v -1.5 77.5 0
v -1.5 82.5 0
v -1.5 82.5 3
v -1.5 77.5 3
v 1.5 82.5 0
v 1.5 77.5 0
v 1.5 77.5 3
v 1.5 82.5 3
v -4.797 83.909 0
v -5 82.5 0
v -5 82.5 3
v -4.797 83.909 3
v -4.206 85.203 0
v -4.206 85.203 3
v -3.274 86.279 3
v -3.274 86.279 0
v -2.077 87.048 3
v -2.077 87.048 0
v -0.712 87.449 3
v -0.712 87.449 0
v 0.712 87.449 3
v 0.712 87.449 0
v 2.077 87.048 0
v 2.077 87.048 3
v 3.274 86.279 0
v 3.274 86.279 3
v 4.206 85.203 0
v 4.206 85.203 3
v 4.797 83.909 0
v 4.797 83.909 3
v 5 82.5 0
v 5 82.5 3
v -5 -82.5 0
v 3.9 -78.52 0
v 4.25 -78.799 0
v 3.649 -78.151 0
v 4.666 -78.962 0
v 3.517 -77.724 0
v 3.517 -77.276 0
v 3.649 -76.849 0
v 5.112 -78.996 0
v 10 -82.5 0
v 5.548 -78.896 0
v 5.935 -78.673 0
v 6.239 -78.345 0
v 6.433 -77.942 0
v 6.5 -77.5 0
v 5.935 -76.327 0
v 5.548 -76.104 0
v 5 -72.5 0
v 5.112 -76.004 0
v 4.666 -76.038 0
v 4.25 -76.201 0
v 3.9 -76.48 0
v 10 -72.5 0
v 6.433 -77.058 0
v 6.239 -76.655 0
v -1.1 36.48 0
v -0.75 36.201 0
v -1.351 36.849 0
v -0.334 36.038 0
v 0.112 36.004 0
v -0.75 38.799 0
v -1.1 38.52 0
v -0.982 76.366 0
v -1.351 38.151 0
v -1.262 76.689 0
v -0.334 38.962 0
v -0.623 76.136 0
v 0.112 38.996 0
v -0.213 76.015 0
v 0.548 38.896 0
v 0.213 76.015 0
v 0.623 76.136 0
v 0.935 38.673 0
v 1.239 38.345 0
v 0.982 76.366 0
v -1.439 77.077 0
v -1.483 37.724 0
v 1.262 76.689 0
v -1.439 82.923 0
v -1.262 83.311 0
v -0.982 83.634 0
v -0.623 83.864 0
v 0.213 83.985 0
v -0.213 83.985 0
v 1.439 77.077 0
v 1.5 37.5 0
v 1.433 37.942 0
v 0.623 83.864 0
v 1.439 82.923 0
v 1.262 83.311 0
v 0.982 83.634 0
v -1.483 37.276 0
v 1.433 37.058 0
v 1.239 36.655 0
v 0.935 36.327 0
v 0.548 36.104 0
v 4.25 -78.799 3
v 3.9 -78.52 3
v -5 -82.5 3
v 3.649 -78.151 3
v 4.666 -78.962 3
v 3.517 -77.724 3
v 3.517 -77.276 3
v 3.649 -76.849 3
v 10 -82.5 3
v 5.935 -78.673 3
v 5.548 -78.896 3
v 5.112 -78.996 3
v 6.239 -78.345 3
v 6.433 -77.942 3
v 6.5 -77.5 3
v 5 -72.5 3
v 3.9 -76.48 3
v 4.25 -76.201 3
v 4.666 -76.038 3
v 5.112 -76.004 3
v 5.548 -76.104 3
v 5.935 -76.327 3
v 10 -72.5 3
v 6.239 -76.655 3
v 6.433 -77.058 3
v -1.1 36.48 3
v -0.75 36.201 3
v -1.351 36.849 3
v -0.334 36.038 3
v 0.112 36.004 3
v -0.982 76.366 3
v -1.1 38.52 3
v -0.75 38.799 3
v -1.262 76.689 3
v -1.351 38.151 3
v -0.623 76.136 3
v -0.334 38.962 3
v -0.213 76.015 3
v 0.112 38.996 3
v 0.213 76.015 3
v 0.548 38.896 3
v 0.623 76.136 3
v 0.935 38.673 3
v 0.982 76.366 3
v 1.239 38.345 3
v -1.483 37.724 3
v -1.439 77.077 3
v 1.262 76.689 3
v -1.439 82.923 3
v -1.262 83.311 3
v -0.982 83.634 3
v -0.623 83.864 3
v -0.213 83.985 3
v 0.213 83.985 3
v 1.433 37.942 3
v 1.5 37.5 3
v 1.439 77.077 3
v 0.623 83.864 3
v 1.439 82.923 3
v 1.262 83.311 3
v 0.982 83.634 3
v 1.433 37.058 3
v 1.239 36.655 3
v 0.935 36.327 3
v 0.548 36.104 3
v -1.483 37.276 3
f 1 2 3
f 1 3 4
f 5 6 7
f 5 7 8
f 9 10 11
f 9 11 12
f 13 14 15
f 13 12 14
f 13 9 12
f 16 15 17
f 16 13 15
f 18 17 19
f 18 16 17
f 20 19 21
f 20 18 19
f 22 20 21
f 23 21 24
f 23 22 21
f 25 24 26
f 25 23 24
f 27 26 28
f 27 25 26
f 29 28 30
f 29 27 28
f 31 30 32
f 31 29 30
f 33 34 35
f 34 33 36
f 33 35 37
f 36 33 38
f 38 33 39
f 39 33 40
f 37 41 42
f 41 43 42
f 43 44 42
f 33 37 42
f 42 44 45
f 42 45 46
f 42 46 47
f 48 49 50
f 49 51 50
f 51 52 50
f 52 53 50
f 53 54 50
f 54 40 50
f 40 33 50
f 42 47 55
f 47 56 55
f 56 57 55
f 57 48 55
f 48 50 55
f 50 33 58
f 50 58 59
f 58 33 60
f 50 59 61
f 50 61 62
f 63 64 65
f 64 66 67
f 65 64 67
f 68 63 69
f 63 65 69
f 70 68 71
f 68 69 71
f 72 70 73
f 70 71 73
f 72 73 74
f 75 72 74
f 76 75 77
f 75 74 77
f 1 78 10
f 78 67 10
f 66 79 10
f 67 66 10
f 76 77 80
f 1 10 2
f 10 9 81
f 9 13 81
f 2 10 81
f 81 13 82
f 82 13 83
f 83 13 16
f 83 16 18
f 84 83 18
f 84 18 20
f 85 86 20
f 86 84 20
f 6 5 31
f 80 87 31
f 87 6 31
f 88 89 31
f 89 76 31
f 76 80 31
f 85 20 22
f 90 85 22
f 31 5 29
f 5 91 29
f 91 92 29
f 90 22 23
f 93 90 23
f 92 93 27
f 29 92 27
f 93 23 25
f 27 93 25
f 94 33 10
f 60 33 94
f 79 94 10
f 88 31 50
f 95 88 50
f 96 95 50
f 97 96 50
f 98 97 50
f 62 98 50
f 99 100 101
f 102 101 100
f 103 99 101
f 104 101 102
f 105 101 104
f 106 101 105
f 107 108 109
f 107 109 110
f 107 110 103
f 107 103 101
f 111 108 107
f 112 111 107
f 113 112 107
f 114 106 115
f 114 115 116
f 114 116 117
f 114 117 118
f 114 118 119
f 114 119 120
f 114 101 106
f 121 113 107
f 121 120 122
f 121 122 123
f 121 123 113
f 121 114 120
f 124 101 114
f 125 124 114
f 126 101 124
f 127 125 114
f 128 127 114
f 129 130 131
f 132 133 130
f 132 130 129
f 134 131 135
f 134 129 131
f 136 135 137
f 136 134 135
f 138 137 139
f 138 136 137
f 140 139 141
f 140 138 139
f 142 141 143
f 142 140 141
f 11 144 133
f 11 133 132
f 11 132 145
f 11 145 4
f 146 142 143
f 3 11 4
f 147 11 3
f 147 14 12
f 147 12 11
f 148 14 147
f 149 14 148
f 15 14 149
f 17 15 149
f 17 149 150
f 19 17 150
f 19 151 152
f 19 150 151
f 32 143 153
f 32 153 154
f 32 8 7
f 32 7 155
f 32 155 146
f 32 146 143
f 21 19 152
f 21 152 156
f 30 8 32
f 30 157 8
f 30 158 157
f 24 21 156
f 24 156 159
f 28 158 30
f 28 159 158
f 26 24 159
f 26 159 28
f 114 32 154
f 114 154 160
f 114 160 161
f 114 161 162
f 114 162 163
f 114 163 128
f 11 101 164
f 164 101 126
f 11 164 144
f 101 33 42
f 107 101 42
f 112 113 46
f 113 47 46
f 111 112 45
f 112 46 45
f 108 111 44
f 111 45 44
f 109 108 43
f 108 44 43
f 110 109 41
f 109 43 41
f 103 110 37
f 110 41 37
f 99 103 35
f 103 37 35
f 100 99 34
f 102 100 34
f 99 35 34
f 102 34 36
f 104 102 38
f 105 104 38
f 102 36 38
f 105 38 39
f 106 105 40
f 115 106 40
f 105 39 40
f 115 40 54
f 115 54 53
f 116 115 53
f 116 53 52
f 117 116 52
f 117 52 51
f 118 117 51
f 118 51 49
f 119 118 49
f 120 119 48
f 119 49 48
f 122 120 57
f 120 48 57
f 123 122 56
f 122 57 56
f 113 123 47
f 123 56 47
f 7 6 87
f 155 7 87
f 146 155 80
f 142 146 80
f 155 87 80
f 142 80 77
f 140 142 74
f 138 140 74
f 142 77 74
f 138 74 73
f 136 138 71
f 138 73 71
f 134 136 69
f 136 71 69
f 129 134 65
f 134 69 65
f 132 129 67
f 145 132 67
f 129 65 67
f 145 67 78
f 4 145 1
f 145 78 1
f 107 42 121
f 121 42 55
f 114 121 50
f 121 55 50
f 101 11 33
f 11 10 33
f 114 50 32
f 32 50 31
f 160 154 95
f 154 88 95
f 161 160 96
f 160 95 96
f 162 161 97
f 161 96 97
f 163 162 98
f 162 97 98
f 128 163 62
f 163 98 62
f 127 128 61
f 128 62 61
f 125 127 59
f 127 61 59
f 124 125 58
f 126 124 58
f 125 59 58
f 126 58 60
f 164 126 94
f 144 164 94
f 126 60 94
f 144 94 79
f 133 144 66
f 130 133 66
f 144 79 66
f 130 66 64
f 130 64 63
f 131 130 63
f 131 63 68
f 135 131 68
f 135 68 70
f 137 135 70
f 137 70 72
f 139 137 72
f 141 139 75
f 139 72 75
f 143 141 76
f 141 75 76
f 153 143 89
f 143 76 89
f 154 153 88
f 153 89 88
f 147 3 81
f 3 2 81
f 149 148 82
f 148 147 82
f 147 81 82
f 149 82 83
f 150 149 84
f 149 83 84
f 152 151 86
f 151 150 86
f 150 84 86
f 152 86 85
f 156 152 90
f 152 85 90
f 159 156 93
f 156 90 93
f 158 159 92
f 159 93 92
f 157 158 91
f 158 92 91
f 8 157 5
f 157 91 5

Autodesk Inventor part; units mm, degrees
ref_plane "YZ Plane" through (0, 0, 0) normal (1, 0, 0) x (0, 1, 0)
ref_plane "XZ Plane" through (0, 0, 0) normal (0, 1, 0) x (-1, 0, 0)
ref_plane "XY Plane" through (0, 0, 0) normal (0, 0, 1) x (1, 0, 0)
sketch "Эскиз1" plane through (0, 0, 0) normal (0, 0, 1) x (1, 0, 0)
  line L0 (-5, -82.5) -> (5, -82.5)
  line L1 (5, -82.5) -> (5, 82.5)
  line L2 (5, 82.5) -> (-5, 82.5)
  line L3 (-5, 82.5) -> (-5, -82.5)
  line L4 (-5, -82.5) -> (5, 82.5) construction
  line L5 (5, -82.5) -> (-5, 82.5) construction
  line L6 (-5, 82.5) -> (0, 82.5)
  line L7 (0, 82.5) -> (0, 77.5)
  line L8 (0, 77.5) -> (-5, 77.5)
  line L9 (-5, 77.5) -> (-5, 82.5)
  circle A0 centre (0, 77.5) radius 1.5
  line L10 (-5, 82.5) -> (5, 82.5)
  line L11 (5, 82.5) -> (5, 87.5)
  line L12 (5, 87.5) -> (-5, 87.5)
  line L13 (-5, 87.5) -> (-5, 82.5)
  circle A1 centre (0, 82.5) radius 1.5
  line L14 (-1.5, 82.5) -> (-1.5, 77.5)
  line L15 (1.5, 77.5) -> (1.5, 82.5)
  arc A2 (5, 82.5) -> (-5, 82.5) centre (0, 82.5) ccw
  line L16 (0, 77.5) -> (-5, 77.5)
  line L17 (-5, 77.5) -> (-5, 37.5)
  line L18 (-5, 37.5) -> (0, 37.5)
  line L19 (0, 37.5) -> (0, 77.5)
  circle A3 centre (0, 37.5) radius 1.5
  line L20 (-5, -82.5) -> (0, -82.5)
  line L21 (0, -82.5) -> (0, -77.5)
  line L22 (0, -77.5) -> (-5, -77.5)
  line L23 (-5, -77.5) -> (-5, -82.5)
  line L24 (-5, -82.5) -> (10, -82.5)
  line L25 (10, -82.5) -> (10, -72.5)
  line L26 (10, -72.5) -> (-5, -72.5)
  line L27 (-5, -72.5) -> (-5, -82.5)
  circle A4 centre (5, -77.5) radius 1.5
  point P0 (0, 0)
  point P1 (5, -72.5)
  dimension "d0" = 10
  dimension "d1" = 165
  dimension "d2" = 5
  dimension "d3" = 3
  dimension "d4" = 5
  dimension "d5" = 3
  dimension "d6" = 40
  dimension "d7" = 3
  dimension "d8" = 5
  dimension "d12" = 15
  dimension "d13" = 10
  dimension "d14" = 3
extrude "Выдавливание1" add sketch "Эскиз1" along normal blind 3 contours L3 L22 L21 L0 | L21 L22 L3 L26 L1 A4 L0 | L1 A4 L26 L25 L24 | L3 L18 A3 L19 A0 L15 L2 L1 L26 | L3 L8 A0 L19 A3 L18 | L3 L2 L14 L8 | L2 A1 A2
properties part number "пиналка_1"
